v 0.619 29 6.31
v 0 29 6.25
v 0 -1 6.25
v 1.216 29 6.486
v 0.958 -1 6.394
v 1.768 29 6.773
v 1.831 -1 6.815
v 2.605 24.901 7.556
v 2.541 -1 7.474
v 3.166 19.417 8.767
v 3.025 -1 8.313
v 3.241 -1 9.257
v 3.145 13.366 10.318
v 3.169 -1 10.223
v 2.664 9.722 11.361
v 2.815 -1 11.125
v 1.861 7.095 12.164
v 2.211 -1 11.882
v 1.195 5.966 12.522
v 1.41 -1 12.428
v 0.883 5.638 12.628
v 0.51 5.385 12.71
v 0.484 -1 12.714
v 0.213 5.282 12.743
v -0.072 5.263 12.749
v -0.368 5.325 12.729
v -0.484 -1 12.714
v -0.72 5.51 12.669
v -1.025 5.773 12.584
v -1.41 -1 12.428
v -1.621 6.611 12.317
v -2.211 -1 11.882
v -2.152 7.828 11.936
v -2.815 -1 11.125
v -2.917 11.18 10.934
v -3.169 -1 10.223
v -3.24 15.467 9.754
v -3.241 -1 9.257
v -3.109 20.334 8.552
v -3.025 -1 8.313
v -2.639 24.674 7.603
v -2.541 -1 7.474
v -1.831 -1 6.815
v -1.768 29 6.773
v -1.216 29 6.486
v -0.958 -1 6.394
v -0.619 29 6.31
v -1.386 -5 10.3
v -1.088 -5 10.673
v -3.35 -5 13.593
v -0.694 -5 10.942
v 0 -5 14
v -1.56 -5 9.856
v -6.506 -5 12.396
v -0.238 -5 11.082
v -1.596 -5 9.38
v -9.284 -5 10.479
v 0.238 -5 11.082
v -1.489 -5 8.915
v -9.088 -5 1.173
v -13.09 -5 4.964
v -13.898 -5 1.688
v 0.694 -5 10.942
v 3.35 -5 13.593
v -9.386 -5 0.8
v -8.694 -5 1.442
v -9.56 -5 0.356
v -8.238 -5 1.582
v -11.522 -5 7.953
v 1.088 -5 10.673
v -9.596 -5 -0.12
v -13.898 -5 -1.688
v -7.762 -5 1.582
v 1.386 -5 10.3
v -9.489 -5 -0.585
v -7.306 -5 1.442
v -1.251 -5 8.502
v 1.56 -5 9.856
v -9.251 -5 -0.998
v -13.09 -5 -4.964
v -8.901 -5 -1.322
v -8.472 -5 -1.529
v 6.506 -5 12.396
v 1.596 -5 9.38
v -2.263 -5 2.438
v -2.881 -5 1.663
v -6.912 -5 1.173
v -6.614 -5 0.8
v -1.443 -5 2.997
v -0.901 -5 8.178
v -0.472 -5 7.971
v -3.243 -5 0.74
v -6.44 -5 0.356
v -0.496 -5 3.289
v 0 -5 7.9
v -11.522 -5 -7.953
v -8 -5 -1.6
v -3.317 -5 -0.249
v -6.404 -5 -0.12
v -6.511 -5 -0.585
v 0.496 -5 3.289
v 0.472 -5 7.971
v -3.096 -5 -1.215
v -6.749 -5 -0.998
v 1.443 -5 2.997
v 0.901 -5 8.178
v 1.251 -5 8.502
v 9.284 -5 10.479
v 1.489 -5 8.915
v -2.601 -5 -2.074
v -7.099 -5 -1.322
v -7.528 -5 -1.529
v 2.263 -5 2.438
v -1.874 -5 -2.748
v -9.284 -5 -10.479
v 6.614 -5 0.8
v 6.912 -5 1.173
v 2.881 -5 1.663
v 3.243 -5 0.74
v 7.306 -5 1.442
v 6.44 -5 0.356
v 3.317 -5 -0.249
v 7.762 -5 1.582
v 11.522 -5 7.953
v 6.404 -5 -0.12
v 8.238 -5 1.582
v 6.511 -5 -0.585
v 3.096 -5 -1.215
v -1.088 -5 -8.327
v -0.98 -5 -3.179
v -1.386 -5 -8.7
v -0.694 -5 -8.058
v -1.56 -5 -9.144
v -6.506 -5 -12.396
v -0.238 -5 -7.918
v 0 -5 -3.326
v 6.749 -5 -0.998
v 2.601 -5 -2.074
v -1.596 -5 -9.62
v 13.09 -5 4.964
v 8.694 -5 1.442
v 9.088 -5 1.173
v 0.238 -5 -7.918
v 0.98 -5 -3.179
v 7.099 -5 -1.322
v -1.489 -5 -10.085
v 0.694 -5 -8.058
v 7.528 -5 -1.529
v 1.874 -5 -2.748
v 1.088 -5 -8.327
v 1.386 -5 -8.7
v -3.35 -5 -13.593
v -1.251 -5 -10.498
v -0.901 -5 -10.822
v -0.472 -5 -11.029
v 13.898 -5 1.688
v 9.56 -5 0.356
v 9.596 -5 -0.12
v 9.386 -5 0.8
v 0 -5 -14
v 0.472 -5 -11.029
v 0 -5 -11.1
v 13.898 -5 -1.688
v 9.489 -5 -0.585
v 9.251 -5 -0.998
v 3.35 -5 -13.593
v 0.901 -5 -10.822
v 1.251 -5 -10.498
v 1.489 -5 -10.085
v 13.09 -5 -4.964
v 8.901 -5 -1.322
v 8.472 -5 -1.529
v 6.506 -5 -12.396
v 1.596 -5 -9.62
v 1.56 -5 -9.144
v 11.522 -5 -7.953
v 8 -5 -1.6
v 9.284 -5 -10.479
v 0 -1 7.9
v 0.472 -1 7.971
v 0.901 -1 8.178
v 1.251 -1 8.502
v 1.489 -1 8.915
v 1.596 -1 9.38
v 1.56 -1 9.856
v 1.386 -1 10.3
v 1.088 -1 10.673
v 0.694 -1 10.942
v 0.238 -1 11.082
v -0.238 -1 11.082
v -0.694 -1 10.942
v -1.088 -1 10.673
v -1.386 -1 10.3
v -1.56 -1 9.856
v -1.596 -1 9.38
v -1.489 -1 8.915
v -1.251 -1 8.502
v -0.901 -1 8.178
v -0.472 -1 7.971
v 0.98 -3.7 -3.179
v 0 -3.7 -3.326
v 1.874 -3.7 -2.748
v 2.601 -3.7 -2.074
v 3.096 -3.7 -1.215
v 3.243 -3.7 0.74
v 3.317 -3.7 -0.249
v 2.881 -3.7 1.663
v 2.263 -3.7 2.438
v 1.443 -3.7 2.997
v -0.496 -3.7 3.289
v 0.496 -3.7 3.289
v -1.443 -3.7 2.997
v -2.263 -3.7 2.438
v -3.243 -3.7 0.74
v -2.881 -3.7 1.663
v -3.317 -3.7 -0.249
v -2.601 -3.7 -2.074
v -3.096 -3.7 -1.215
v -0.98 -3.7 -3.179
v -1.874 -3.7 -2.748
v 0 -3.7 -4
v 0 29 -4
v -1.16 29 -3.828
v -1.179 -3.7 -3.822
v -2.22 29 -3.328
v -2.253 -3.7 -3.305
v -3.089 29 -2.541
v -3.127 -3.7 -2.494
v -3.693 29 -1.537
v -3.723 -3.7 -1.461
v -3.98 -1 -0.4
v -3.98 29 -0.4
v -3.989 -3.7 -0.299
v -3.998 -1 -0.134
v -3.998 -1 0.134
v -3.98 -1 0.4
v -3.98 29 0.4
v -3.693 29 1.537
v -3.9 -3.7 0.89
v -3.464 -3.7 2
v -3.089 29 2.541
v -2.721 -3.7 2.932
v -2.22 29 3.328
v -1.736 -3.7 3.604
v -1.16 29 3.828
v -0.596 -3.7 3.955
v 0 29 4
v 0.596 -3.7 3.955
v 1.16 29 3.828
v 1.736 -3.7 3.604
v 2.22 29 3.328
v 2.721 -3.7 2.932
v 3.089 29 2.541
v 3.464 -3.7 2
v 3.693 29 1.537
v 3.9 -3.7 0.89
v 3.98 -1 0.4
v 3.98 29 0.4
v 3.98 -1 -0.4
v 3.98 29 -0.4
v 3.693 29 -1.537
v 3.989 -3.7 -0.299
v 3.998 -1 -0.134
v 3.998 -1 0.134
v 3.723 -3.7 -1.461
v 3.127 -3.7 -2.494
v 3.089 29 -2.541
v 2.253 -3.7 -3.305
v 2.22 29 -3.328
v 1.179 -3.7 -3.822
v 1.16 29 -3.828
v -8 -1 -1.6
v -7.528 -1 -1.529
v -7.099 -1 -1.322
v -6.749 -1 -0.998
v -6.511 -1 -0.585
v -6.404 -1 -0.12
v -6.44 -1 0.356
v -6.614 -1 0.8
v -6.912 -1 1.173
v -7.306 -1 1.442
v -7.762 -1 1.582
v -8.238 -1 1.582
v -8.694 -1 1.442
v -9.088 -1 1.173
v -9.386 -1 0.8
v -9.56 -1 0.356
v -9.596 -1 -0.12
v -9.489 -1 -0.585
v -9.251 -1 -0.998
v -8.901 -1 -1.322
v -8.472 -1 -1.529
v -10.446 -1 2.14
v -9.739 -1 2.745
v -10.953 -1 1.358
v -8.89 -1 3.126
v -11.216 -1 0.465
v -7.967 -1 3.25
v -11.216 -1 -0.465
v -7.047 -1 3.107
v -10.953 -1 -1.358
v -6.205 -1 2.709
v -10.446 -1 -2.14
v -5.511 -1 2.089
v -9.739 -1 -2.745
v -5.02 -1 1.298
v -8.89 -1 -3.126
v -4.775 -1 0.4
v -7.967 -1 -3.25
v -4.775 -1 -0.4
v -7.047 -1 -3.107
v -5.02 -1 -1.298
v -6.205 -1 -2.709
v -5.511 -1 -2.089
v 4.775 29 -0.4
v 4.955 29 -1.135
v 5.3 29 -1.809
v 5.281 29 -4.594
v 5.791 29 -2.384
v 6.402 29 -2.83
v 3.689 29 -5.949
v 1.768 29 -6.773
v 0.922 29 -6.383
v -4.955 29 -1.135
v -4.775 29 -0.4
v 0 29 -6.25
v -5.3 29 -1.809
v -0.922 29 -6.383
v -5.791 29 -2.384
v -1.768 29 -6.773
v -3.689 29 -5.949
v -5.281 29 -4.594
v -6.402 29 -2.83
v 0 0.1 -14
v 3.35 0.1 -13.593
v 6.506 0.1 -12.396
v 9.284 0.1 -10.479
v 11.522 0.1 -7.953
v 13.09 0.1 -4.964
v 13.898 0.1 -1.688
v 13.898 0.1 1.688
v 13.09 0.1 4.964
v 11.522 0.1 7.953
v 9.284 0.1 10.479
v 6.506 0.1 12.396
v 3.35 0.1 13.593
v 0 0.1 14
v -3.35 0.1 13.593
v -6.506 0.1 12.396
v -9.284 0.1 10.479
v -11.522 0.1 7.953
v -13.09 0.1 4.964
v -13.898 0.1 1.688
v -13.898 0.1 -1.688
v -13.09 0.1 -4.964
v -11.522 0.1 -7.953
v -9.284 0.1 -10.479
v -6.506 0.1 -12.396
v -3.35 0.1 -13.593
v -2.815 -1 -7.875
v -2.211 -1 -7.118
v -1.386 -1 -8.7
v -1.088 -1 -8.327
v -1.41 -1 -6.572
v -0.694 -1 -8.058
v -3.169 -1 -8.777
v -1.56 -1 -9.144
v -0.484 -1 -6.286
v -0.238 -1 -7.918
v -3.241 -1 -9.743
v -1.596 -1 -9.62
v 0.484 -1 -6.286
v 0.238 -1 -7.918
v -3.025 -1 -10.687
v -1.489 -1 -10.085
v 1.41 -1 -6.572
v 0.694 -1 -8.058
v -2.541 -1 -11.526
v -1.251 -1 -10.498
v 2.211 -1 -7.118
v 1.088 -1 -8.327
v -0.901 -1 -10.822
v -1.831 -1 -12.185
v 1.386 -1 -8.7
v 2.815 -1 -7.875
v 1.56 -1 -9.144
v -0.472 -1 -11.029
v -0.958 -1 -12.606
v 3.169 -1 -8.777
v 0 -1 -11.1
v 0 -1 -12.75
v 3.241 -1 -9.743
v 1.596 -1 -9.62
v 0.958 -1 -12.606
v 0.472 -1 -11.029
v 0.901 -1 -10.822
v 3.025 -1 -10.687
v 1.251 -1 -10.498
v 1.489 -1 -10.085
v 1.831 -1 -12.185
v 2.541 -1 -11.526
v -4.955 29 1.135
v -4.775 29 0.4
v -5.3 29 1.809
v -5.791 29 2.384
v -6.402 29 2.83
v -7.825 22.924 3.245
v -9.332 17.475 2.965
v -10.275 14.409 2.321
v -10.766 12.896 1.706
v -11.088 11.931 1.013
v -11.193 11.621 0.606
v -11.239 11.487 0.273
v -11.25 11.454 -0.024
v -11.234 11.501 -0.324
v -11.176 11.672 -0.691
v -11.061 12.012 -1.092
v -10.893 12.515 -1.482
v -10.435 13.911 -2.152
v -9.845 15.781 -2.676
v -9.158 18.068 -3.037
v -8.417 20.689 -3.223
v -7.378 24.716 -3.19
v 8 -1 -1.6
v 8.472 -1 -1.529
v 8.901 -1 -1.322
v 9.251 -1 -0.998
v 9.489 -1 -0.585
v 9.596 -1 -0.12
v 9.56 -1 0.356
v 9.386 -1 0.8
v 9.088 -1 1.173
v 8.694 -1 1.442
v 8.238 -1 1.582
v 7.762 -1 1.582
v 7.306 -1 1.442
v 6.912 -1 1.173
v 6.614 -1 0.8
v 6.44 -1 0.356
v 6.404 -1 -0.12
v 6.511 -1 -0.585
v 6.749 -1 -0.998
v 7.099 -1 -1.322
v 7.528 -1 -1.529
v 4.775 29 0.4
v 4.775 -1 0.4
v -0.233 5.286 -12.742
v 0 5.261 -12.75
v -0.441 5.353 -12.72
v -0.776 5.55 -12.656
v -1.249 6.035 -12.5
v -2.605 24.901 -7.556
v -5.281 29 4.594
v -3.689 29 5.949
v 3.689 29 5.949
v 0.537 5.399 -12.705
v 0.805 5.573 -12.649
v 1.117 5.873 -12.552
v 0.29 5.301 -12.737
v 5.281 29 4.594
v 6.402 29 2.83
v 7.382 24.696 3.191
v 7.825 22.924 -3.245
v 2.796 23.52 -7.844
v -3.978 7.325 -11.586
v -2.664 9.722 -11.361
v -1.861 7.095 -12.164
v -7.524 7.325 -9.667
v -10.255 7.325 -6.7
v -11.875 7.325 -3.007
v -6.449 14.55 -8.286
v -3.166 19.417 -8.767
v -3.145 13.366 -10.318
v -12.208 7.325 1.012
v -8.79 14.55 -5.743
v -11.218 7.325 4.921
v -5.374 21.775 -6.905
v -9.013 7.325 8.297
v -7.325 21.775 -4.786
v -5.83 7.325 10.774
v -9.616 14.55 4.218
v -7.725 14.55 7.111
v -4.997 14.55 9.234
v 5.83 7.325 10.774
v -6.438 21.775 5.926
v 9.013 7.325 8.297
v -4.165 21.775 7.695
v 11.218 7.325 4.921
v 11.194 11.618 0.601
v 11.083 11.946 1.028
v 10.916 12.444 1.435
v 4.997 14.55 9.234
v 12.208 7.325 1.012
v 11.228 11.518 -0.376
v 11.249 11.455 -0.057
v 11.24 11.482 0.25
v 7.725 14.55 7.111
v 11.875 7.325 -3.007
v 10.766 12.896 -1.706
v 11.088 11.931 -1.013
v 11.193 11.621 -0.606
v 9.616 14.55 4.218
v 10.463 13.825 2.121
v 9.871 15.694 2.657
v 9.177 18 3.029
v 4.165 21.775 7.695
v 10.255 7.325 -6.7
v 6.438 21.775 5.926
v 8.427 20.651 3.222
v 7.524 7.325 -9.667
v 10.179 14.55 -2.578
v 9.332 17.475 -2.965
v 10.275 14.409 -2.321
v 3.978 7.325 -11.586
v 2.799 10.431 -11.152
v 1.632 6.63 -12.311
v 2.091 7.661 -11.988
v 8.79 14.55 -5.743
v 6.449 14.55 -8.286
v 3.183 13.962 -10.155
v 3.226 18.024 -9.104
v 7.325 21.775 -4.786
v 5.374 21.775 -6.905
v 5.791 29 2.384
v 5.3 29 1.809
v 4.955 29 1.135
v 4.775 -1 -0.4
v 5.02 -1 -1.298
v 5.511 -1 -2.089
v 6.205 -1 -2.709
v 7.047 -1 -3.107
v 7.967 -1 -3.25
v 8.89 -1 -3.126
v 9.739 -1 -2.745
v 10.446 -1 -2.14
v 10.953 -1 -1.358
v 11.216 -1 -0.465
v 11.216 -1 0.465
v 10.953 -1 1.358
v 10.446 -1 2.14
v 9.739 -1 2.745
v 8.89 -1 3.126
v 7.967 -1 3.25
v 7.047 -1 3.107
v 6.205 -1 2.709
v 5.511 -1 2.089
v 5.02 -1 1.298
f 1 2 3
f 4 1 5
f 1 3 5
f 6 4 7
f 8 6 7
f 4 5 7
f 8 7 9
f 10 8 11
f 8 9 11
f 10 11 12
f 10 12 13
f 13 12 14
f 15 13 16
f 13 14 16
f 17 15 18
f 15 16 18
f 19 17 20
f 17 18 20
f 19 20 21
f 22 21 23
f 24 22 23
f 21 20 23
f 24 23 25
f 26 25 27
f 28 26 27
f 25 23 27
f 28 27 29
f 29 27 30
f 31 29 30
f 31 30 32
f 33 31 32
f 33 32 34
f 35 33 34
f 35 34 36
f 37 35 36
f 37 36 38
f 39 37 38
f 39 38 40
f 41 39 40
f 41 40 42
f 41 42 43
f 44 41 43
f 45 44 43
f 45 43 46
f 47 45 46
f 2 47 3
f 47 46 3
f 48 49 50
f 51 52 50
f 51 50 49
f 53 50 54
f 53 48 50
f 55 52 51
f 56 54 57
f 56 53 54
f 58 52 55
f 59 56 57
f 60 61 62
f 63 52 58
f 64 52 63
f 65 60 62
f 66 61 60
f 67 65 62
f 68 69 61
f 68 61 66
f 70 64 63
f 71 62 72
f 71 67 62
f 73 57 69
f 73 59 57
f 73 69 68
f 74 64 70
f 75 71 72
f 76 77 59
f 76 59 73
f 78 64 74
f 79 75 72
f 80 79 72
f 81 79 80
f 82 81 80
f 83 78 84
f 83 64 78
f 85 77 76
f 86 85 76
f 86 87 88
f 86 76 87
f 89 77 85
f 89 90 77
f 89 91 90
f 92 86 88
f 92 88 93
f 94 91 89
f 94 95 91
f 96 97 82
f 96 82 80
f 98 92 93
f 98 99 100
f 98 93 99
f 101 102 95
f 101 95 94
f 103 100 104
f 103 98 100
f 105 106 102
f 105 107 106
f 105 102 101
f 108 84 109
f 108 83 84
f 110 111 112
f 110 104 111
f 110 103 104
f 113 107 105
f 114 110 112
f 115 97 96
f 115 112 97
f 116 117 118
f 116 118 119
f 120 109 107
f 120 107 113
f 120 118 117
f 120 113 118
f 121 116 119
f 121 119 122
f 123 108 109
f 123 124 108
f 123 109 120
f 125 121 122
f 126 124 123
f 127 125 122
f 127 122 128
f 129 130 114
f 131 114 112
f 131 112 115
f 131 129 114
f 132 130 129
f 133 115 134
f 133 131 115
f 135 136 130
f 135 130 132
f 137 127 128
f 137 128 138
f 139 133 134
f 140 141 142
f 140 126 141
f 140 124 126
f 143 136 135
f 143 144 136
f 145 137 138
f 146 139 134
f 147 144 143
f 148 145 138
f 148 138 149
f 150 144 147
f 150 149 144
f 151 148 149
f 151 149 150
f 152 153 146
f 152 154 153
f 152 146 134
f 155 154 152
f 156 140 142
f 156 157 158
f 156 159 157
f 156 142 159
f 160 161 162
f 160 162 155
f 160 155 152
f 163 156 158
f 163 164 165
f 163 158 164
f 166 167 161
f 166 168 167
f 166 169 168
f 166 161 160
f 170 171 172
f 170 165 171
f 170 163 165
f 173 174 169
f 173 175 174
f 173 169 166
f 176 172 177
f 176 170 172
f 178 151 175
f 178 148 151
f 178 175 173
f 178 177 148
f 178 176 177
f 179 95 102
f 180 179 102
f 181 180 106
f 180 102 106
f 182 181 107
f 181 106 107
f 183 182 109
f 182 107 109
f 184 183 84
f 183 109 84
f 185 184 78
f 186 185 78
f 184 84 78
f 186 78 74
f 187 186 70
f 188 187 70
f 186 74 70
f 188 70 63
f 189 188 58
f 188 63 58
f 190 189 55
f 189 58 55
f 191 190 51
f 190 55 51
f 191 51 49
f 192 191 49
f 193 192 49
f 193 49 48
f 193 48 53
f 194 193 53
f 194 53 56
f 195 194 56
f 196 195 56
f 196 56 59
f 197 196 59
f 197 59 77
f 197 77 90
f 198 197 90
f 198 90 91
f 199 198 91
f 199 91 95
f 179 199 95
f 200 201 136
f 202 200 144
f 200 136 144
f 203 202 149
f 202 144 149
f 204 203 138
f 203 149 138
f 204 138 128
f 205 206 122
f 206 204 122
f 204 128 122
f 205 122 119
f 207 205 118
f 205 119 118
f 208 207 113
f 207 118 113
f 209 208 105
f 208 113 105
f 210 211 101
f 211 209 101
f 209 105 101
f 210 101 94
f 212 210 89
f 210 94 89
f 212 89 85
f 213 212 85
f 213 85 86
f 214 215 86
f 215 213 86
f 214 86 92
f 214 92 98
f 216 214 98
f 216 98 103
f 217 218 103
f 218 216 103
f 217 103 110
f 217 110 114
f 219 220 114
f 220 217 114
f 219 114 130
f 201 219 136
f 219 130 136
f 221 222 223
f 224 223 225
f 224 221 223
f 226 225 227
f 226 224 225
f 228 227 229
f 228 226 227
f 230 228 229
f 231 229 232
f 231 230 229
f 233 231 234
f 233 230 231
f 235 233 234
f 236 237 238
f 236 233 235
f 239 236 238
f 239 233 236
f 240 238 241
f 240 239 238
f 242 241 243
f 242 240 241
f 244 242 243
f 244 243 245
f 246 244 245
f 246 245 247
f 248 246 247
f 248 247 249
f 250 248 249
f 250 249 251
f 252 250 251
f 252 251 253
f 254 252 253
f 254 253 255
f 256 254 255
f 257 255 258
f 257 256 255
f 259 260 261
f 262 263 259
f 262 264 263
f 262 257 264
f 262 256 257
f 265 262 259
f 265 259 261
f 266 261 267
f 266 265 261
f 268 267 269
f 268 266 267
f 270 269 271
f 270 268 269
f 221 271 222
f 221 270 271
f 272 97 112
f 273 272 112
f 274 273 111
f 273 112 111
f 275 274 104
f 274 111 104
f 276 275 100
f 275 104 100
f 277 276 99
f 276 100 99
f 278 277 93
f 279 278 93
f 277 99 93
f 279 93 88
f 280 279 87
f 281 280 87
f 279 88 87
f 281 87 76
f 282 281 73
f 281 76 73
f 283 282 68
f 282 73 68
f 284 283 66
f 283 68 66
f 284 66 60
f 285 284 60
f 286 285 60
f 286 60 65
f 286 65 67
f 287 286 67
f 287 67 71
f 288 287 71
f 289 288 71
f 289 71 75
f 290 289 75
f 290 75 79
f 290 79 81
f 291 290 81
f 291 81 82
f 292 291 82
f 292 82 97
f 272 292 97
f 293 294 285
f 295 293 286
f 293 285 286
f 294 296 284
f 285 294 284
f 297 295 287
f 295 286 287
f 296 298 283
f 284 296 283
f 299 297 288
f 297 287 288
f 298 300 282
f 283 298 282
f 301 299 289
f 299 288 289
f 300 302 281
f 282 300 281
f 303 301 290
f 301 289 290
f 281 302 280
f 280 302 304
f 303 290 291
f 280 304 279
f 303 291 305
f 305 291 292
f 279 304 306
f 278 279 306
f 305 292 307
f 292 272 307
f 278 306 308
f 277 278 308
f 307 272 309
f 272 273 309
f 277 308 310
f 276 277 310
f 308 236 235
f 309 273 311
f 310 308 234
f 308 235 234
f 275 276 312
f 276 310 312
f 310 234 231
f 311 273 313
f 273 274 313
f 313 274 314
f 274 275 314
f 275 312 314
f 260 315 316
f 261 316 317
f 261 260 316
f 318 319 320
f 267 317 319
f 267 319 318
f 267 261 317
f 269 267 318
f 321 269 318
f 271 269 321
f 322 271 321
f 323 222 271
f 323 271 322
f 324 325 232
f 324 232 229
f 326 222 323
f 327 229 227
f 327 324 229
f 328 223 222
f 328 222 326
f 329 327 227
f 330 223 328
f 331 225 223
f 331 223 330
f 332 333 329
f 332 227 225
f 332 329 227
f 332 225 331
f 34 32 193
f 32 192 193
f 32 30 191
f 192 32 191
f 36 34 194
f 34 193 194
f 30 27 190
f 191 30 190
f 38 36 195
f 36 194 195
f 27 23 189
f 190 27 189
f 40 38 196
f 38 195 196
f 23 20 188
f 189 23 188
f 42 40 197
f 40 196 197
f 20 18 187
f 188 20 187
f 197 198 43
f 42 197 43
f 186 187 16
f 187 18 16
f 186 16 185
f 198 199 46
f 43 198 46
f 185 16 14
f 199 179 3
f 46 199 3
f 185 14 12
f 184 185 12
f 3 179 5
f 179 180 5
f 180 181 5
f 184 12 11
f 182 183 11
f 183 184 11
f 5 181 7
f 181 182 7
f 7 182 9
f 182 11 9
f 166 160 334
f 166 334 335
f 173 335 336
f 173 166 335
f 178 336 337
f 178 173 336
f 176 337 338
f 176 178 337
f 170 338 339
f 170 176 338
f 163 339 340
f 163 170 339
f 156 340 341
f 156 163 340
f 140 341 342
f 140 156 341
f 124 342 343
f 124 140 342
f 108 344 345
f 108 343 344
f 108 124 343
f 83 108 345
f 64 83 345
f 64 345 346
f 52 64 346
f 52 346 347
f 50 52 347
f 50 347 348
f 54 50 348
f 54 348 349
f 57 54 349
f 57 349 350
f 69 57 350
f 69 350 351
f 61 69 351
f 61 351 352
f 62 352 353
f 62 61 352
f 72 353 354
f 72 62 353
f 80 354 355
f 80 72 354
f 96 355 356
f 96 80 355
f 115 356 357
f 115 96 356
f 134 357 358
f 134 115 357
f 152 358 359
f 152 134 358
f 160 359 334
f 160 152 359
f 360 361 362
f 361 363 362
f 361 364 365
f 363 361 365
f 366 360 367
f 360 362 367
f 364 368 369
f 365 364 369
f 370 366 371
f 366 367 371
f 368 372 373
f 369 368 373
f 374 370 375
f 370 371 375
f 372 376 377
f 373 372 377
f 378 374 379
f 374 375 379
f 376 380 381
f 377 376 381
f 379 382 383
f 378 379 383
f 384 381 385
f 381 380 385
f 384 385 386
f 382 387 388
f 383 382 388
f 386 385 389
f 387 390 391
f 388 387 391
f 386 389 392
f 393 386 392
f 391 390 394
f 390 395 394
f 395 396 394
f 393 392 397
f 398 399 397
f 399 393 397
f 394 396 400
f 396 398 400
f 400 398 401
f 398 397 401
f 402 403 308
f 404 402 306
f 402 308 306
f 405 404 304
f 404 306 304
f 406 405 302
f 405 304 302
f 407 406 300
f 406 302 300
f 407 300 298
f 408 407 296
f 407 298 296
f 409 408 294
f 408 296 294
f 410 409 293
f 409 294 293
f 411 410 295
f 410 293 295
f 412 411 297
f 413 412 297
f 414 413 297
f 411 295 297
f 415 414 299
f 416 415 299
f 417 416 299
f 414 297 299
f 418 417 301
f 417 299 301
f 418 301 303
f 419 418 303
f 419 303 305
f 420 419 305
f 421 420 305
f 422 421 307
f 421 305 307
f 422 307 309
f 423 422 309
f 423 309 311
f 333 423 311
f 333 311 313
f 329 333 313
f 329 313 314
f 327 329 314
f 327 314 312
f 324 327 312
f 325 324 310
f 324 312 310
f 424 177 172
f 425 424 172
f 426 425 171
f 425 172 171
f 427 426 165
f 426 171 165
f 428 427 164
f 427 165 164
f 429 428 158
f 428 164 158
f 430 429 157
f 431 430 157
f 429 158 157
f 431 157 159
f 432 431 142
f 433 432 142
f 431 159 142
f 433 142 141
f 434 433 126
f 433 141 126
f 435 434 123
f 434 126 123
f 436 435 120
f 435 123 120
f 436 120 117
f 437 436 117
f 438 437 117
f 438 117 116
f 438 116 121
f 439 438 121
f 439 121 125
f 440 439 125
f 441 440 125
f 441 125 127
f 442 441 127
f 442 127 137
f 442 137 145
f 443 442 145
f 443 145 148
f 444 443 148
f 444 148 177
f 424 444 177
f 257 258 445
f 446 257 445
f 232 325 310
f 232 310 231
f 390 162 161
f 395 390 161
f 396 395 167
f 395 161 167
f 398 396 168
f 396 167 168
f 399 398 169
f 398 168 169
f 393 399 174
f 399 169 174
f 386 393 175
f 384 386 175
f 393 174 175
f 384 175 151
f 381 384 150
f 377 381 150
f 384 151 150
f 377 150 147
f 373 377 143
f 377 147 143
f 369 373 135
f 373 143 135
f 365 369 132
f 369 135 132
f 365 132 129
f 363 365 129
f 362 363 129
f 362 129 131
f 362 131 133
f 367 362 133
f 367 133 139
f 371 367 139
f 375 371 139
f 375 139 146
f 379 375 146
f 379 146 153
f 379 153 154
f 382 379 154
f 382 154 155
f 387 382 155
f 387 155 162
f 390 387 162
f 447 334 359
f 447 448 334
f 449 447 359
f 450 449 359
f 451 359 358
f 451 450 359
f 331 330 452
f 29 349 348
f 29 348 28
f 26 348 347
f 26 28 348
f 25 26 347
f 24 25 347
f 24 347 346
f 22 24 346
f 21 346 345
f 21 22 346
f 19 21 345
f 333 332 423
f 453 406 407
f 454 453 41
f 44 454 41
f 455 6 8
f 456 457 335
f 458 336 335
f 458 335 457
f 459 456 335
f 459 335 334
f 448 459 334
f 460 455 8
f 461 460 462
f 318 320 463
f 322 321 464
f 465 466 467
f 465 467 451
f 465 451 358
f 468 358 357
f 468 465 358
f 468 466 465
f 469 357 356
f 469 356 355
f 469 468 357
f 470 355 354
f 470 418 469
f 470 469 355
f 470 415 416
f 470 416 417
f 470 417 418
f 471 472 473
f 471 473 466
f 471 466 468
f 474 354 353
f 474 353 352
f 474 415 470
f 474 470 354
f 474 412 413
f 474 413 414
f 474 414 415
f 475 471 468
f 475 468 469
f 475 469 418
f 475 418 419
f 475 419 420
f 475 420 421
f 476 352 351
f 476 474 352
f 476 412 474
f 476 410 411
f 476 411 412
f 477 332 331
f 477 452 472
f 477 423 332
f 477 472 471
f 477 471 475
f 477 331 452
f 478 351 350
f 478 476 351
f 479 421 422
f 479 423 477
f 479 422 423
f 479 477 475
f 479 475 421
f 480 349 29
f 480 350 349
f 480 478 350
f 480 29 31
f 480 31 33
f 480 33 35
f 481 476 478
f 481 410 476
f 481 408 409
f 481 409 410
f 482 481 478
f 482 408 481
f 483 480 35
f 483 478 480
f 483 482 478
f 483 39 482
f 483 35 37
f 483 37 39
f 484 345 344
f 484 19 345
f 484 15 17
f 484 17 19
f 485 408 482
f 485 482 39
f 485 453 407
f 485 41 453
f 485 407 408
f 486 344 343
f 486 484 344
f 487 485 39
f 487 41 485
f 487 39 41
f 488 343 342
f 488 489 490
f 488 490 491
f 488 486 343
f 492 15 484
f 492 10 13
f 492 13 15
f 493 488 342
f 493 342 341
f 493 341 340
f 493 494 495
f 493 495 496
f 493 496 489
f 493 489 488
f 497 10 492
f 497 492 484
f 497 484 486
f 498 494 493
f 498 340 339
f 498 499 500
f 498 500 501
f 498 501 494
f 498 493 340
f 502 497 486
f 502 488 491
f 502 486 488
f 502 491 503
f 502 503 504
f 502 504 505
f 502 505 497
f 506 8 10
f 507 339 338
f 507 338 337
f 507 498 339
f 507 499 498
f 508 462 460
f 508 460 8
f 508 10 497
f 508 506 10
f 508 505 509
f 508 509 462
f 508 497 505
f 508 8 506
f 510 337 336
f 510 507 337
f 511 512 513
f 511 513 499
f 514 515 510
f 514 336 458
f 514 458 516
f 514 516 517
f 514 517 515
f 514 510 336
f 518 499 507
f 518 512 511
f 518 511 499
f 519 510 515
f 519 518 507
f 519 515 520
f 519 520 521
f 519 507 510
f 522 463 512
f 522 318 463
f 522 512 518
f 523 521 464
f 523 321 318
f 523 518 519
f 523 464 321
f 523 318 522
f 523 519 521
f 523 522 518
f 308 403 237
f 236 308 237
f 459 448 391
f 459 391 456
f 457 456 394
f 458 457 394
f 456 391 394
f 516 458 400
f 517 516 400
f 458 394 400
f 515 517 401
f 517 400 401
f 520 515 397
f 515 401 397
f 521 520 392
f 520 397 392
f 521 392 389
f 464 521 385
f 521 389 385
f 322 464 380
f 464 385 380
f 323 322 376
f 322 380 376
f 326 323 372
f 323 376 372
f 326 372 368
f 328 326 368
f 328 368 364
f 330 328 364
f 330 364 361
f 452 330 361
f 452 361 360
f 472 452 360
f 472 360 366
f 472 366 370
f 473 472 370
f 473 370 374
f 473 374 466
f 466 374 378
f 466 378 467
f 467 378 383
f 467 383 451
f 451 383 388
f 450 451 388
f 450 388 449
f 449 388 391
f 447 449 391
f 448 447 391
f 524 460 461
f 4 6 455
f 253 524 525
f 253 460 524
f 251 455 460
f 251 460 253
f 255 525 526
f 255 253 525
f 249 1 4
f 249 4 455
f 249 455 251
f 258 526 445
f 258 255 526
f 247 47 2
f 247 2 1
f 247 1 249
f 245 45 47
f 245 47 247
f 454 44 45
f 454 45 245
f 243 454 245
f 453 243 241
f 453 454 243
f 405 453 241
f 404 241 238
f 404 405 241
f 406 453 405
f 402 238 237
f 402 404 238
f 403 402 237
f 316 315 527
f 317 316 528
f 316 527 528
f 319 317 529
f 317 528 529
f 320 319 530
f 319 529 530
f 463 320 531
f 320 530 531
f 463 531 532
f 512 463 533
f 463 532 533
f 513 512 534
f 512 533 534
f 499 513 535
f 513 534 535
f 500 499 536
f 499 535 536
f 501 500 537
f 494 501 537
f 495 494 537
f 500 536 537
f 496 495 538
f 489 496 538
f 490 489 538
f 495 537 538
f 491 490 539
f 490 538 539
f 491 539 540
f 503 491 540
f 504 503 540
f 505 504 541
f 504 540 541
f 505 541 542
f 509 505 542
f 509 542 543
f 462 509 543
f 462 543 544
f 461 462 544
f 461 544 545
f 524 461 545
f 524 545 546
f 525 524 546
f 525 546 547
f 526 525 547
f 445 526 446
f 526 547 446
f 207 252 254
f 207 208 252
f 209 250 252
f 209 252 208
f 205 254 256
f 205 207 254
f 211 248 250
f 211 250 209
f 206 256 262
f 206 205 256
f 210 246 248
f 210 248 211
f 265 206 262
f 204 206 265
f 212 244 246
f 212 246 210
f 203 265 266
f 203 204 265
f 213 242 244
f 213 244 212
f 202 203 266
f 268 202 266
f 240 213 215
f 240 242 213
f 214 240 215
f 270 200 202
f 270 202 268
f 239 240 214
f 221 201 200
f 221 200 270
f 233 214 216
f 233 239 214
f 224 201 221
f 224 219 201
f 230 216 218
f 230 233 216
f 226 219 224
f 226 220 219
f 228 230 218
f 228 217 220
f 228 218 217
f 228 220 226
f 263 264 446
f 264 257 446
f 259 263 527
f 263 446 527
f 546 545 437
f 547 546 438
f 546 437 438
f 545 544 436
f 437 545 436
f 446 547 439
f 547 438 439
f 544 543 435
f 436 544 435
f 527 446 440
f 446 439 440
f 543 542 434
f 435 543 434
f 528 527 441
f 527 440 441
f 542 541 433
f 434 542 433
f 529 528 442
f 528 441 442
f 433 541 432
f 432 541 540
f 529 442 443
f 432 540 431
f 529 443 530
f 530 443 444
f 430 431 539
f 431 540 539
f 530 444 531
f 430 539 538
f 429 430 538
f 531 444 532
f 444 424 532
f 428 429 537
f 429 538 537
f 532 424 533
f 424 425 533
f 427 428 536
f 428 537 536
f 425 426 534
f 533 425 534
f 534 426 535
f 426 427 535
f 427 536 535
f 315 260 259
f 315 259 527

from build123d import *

# Parameters (mm, degrees)
SKETCH_2_R          = 1.6
CUT_EXTRUDE_1_DEPTH = 36.114099732
SKETCH_5_R          = 4
SKETCH_5_R_2        = 3.326438837
EXTRUDE_1_DEPTH     = 0.3
EXTRUDE_START       = 5
SKETCH_6_R          = 14
SKETCH_6_R_2        = 3.326438837
SKETCH_6_R_3        = 1.6
EXTRUDE_2_DEPTH     = 5
CUT_EXTRUDE_START   = 1
SKETCH_3_R          = 3.25
CUT_EXTRUDE_5_DEPTH = 37.114099894
CUT_EXTRUDE_START_2 = -4
SKETCH_7_R          = 4
SKETCH_7_R_2        = 3.326438837
CUT_EXTRUDE_6_DEPTH = 4
SKETCH_8_W          = 12
SKETCH_8_H          = 0.8
CUT_EXTRUDE_7_DEPTH = 30


with BuildPart() as part:
    # 草图1 → 旋转1 (revolve)
    with BuildSketch(Plane.XY, mode=Mode.PRIVATE) as revolve_1_sk:
        Polygon((4, 29), (4, 0), (14, 0), (14, 0.1), (7, 29), align=None)
    revolve(revolve_1_sk.sketch.rotate(Axis((0, 0, 0), (0, 1, 0)), 90), axis=Axis((0, 0, 0), (0, 1, 0)))

    # 草图2 → 切除-拉伸1 (cut, through all)
    with BuildSketch(Plane.XZ):
        with Locations(Location((8, 0, 0), (0, 0, 270))):
            Circle(SKETCH_2_R)
        with Locations(Location((0, 9.5, 0), (0, 0, 270))):
            Circle(SKETCH_2_R)
        with Locations(Location((0, -9.5, 0), (0, 0, 270))):
            Circle(SKETCH_2_R)
        with Locations(Location((-8, 0, 0), (0, 0, 270))):
            Circle(SKETCH_2_R)
    extrude(amount=-CUT_EXTRUDE_1_DEPTH, mode=Mode.SUBTRACT)

    # 草图5 → 凸台-拉伸1 (add)
    with BuildSketch(Plane.XZ):
        with Locations(Location((0, 0, 0), (0, 0, 270))):
            Circle(SKETCH_5_R)
        with Locations(Location((0, 0, 0), (0, 0, 270))):
            Circle(SKETCH_5_R_2, mode=Mode.SUBTRACT)
    extrude(amount=-EXTRUDE_1_DEPTH)

    # 草图6 → 凸台-拉伸2 (add)
    with BuildSketch(Plane.XZ.offset(EXTRUDE_START)):
        with Locations(Location((0, 0, 0), (0, 0, 270))):
            Circle(SKETCH_6_R)
        with Locations(Location((0, 0, 0), (0, 0, 270))):
            Circle(SKETCH_6_R_2, mode=Mode.SUBTRACT)
        with Locations(Location((0, 9.5, 0), (0, 0, 270))):
            Circle(SKETCH_6_R_3, mode=Mode.SUBTRACT)
        with Locations(Location((-8, 0, 0), (0, 0, 270))):
            Circle(SKETCH_6_R_3, mode=Mode.SUBTRACT)
        with Locations(Location((8, 0, 0), (0, 0, 270))):
            Circle(SKETCH_6_R_3, mode=Mode.SUBTRACT)
        with Locations(Location((0, -9.5, 0), (0, 0, 270))):
            Circle(SKETCH_6_R_3, mode=Mode.SUBTRACT)
    extrude(amount=-EXTRUDE_2_DEPTH)

    # 草图3 → 切除-拉伸5 (cut, through all)
    with BuildSketch(Plane.XZ.offset(CUT_EXTRUDE_START)):
        with Locations(Location((0, 9.5, 0), (0, 0, 270))):
            Circle(SKETCH_3_R)
        with Locations(Location((8, 0, 0), (0, 0, 270))):
            Circle(SKETCH_3_R)
        with Locations(Location((0, -9.5, 0), (0, 0, 270))):
            Circle(SKETCH_3_R)
        with Locations(Location((-8, 0, 0), (0, 0, 270))):
            Circle(SKETCH_3_R)
    extrude(amount=-CUT_EXTRUDE_5_DEPTH, mode=Mode.SUBTRACT)

    # 草图7 → 切除-拉伸6 (cut)
    with BuildSketch(Plane(origin=(0, 0.3, 0), x_dir=(1, 0, 0), z_dir=(0, 1, 0)).offset(CUT_EXTRUDE_START_2)):
        with Locations(Location((0, 0, 0), (0, 0, 90))):
            Circle(SKETCH_7_R)
        with Locations(Location((0, 0, 0), (0, 0, 90))):
            Circle(SKETCH_7_R_2, mode=Mode.SUBTRACT)
    extrude(amount=CUT_EXTRUDE_6_DEPTH, mode=Mode.SUBTRACT)

    # 草图8 → 切除-拉伸7 (cut)
    with BuildSketch(Plane(origin=(0, 29, 0), x_dir=(1, 0, 0), z_dir=(0, 1, 0))):
        Rectangle(SKETCH_8_W, SKETCH_8_H)
    extrude(amount=-CUT_EXTRUDE_7_DEPTH, mode=Mode.SUBTRACT)


solid = part.part
